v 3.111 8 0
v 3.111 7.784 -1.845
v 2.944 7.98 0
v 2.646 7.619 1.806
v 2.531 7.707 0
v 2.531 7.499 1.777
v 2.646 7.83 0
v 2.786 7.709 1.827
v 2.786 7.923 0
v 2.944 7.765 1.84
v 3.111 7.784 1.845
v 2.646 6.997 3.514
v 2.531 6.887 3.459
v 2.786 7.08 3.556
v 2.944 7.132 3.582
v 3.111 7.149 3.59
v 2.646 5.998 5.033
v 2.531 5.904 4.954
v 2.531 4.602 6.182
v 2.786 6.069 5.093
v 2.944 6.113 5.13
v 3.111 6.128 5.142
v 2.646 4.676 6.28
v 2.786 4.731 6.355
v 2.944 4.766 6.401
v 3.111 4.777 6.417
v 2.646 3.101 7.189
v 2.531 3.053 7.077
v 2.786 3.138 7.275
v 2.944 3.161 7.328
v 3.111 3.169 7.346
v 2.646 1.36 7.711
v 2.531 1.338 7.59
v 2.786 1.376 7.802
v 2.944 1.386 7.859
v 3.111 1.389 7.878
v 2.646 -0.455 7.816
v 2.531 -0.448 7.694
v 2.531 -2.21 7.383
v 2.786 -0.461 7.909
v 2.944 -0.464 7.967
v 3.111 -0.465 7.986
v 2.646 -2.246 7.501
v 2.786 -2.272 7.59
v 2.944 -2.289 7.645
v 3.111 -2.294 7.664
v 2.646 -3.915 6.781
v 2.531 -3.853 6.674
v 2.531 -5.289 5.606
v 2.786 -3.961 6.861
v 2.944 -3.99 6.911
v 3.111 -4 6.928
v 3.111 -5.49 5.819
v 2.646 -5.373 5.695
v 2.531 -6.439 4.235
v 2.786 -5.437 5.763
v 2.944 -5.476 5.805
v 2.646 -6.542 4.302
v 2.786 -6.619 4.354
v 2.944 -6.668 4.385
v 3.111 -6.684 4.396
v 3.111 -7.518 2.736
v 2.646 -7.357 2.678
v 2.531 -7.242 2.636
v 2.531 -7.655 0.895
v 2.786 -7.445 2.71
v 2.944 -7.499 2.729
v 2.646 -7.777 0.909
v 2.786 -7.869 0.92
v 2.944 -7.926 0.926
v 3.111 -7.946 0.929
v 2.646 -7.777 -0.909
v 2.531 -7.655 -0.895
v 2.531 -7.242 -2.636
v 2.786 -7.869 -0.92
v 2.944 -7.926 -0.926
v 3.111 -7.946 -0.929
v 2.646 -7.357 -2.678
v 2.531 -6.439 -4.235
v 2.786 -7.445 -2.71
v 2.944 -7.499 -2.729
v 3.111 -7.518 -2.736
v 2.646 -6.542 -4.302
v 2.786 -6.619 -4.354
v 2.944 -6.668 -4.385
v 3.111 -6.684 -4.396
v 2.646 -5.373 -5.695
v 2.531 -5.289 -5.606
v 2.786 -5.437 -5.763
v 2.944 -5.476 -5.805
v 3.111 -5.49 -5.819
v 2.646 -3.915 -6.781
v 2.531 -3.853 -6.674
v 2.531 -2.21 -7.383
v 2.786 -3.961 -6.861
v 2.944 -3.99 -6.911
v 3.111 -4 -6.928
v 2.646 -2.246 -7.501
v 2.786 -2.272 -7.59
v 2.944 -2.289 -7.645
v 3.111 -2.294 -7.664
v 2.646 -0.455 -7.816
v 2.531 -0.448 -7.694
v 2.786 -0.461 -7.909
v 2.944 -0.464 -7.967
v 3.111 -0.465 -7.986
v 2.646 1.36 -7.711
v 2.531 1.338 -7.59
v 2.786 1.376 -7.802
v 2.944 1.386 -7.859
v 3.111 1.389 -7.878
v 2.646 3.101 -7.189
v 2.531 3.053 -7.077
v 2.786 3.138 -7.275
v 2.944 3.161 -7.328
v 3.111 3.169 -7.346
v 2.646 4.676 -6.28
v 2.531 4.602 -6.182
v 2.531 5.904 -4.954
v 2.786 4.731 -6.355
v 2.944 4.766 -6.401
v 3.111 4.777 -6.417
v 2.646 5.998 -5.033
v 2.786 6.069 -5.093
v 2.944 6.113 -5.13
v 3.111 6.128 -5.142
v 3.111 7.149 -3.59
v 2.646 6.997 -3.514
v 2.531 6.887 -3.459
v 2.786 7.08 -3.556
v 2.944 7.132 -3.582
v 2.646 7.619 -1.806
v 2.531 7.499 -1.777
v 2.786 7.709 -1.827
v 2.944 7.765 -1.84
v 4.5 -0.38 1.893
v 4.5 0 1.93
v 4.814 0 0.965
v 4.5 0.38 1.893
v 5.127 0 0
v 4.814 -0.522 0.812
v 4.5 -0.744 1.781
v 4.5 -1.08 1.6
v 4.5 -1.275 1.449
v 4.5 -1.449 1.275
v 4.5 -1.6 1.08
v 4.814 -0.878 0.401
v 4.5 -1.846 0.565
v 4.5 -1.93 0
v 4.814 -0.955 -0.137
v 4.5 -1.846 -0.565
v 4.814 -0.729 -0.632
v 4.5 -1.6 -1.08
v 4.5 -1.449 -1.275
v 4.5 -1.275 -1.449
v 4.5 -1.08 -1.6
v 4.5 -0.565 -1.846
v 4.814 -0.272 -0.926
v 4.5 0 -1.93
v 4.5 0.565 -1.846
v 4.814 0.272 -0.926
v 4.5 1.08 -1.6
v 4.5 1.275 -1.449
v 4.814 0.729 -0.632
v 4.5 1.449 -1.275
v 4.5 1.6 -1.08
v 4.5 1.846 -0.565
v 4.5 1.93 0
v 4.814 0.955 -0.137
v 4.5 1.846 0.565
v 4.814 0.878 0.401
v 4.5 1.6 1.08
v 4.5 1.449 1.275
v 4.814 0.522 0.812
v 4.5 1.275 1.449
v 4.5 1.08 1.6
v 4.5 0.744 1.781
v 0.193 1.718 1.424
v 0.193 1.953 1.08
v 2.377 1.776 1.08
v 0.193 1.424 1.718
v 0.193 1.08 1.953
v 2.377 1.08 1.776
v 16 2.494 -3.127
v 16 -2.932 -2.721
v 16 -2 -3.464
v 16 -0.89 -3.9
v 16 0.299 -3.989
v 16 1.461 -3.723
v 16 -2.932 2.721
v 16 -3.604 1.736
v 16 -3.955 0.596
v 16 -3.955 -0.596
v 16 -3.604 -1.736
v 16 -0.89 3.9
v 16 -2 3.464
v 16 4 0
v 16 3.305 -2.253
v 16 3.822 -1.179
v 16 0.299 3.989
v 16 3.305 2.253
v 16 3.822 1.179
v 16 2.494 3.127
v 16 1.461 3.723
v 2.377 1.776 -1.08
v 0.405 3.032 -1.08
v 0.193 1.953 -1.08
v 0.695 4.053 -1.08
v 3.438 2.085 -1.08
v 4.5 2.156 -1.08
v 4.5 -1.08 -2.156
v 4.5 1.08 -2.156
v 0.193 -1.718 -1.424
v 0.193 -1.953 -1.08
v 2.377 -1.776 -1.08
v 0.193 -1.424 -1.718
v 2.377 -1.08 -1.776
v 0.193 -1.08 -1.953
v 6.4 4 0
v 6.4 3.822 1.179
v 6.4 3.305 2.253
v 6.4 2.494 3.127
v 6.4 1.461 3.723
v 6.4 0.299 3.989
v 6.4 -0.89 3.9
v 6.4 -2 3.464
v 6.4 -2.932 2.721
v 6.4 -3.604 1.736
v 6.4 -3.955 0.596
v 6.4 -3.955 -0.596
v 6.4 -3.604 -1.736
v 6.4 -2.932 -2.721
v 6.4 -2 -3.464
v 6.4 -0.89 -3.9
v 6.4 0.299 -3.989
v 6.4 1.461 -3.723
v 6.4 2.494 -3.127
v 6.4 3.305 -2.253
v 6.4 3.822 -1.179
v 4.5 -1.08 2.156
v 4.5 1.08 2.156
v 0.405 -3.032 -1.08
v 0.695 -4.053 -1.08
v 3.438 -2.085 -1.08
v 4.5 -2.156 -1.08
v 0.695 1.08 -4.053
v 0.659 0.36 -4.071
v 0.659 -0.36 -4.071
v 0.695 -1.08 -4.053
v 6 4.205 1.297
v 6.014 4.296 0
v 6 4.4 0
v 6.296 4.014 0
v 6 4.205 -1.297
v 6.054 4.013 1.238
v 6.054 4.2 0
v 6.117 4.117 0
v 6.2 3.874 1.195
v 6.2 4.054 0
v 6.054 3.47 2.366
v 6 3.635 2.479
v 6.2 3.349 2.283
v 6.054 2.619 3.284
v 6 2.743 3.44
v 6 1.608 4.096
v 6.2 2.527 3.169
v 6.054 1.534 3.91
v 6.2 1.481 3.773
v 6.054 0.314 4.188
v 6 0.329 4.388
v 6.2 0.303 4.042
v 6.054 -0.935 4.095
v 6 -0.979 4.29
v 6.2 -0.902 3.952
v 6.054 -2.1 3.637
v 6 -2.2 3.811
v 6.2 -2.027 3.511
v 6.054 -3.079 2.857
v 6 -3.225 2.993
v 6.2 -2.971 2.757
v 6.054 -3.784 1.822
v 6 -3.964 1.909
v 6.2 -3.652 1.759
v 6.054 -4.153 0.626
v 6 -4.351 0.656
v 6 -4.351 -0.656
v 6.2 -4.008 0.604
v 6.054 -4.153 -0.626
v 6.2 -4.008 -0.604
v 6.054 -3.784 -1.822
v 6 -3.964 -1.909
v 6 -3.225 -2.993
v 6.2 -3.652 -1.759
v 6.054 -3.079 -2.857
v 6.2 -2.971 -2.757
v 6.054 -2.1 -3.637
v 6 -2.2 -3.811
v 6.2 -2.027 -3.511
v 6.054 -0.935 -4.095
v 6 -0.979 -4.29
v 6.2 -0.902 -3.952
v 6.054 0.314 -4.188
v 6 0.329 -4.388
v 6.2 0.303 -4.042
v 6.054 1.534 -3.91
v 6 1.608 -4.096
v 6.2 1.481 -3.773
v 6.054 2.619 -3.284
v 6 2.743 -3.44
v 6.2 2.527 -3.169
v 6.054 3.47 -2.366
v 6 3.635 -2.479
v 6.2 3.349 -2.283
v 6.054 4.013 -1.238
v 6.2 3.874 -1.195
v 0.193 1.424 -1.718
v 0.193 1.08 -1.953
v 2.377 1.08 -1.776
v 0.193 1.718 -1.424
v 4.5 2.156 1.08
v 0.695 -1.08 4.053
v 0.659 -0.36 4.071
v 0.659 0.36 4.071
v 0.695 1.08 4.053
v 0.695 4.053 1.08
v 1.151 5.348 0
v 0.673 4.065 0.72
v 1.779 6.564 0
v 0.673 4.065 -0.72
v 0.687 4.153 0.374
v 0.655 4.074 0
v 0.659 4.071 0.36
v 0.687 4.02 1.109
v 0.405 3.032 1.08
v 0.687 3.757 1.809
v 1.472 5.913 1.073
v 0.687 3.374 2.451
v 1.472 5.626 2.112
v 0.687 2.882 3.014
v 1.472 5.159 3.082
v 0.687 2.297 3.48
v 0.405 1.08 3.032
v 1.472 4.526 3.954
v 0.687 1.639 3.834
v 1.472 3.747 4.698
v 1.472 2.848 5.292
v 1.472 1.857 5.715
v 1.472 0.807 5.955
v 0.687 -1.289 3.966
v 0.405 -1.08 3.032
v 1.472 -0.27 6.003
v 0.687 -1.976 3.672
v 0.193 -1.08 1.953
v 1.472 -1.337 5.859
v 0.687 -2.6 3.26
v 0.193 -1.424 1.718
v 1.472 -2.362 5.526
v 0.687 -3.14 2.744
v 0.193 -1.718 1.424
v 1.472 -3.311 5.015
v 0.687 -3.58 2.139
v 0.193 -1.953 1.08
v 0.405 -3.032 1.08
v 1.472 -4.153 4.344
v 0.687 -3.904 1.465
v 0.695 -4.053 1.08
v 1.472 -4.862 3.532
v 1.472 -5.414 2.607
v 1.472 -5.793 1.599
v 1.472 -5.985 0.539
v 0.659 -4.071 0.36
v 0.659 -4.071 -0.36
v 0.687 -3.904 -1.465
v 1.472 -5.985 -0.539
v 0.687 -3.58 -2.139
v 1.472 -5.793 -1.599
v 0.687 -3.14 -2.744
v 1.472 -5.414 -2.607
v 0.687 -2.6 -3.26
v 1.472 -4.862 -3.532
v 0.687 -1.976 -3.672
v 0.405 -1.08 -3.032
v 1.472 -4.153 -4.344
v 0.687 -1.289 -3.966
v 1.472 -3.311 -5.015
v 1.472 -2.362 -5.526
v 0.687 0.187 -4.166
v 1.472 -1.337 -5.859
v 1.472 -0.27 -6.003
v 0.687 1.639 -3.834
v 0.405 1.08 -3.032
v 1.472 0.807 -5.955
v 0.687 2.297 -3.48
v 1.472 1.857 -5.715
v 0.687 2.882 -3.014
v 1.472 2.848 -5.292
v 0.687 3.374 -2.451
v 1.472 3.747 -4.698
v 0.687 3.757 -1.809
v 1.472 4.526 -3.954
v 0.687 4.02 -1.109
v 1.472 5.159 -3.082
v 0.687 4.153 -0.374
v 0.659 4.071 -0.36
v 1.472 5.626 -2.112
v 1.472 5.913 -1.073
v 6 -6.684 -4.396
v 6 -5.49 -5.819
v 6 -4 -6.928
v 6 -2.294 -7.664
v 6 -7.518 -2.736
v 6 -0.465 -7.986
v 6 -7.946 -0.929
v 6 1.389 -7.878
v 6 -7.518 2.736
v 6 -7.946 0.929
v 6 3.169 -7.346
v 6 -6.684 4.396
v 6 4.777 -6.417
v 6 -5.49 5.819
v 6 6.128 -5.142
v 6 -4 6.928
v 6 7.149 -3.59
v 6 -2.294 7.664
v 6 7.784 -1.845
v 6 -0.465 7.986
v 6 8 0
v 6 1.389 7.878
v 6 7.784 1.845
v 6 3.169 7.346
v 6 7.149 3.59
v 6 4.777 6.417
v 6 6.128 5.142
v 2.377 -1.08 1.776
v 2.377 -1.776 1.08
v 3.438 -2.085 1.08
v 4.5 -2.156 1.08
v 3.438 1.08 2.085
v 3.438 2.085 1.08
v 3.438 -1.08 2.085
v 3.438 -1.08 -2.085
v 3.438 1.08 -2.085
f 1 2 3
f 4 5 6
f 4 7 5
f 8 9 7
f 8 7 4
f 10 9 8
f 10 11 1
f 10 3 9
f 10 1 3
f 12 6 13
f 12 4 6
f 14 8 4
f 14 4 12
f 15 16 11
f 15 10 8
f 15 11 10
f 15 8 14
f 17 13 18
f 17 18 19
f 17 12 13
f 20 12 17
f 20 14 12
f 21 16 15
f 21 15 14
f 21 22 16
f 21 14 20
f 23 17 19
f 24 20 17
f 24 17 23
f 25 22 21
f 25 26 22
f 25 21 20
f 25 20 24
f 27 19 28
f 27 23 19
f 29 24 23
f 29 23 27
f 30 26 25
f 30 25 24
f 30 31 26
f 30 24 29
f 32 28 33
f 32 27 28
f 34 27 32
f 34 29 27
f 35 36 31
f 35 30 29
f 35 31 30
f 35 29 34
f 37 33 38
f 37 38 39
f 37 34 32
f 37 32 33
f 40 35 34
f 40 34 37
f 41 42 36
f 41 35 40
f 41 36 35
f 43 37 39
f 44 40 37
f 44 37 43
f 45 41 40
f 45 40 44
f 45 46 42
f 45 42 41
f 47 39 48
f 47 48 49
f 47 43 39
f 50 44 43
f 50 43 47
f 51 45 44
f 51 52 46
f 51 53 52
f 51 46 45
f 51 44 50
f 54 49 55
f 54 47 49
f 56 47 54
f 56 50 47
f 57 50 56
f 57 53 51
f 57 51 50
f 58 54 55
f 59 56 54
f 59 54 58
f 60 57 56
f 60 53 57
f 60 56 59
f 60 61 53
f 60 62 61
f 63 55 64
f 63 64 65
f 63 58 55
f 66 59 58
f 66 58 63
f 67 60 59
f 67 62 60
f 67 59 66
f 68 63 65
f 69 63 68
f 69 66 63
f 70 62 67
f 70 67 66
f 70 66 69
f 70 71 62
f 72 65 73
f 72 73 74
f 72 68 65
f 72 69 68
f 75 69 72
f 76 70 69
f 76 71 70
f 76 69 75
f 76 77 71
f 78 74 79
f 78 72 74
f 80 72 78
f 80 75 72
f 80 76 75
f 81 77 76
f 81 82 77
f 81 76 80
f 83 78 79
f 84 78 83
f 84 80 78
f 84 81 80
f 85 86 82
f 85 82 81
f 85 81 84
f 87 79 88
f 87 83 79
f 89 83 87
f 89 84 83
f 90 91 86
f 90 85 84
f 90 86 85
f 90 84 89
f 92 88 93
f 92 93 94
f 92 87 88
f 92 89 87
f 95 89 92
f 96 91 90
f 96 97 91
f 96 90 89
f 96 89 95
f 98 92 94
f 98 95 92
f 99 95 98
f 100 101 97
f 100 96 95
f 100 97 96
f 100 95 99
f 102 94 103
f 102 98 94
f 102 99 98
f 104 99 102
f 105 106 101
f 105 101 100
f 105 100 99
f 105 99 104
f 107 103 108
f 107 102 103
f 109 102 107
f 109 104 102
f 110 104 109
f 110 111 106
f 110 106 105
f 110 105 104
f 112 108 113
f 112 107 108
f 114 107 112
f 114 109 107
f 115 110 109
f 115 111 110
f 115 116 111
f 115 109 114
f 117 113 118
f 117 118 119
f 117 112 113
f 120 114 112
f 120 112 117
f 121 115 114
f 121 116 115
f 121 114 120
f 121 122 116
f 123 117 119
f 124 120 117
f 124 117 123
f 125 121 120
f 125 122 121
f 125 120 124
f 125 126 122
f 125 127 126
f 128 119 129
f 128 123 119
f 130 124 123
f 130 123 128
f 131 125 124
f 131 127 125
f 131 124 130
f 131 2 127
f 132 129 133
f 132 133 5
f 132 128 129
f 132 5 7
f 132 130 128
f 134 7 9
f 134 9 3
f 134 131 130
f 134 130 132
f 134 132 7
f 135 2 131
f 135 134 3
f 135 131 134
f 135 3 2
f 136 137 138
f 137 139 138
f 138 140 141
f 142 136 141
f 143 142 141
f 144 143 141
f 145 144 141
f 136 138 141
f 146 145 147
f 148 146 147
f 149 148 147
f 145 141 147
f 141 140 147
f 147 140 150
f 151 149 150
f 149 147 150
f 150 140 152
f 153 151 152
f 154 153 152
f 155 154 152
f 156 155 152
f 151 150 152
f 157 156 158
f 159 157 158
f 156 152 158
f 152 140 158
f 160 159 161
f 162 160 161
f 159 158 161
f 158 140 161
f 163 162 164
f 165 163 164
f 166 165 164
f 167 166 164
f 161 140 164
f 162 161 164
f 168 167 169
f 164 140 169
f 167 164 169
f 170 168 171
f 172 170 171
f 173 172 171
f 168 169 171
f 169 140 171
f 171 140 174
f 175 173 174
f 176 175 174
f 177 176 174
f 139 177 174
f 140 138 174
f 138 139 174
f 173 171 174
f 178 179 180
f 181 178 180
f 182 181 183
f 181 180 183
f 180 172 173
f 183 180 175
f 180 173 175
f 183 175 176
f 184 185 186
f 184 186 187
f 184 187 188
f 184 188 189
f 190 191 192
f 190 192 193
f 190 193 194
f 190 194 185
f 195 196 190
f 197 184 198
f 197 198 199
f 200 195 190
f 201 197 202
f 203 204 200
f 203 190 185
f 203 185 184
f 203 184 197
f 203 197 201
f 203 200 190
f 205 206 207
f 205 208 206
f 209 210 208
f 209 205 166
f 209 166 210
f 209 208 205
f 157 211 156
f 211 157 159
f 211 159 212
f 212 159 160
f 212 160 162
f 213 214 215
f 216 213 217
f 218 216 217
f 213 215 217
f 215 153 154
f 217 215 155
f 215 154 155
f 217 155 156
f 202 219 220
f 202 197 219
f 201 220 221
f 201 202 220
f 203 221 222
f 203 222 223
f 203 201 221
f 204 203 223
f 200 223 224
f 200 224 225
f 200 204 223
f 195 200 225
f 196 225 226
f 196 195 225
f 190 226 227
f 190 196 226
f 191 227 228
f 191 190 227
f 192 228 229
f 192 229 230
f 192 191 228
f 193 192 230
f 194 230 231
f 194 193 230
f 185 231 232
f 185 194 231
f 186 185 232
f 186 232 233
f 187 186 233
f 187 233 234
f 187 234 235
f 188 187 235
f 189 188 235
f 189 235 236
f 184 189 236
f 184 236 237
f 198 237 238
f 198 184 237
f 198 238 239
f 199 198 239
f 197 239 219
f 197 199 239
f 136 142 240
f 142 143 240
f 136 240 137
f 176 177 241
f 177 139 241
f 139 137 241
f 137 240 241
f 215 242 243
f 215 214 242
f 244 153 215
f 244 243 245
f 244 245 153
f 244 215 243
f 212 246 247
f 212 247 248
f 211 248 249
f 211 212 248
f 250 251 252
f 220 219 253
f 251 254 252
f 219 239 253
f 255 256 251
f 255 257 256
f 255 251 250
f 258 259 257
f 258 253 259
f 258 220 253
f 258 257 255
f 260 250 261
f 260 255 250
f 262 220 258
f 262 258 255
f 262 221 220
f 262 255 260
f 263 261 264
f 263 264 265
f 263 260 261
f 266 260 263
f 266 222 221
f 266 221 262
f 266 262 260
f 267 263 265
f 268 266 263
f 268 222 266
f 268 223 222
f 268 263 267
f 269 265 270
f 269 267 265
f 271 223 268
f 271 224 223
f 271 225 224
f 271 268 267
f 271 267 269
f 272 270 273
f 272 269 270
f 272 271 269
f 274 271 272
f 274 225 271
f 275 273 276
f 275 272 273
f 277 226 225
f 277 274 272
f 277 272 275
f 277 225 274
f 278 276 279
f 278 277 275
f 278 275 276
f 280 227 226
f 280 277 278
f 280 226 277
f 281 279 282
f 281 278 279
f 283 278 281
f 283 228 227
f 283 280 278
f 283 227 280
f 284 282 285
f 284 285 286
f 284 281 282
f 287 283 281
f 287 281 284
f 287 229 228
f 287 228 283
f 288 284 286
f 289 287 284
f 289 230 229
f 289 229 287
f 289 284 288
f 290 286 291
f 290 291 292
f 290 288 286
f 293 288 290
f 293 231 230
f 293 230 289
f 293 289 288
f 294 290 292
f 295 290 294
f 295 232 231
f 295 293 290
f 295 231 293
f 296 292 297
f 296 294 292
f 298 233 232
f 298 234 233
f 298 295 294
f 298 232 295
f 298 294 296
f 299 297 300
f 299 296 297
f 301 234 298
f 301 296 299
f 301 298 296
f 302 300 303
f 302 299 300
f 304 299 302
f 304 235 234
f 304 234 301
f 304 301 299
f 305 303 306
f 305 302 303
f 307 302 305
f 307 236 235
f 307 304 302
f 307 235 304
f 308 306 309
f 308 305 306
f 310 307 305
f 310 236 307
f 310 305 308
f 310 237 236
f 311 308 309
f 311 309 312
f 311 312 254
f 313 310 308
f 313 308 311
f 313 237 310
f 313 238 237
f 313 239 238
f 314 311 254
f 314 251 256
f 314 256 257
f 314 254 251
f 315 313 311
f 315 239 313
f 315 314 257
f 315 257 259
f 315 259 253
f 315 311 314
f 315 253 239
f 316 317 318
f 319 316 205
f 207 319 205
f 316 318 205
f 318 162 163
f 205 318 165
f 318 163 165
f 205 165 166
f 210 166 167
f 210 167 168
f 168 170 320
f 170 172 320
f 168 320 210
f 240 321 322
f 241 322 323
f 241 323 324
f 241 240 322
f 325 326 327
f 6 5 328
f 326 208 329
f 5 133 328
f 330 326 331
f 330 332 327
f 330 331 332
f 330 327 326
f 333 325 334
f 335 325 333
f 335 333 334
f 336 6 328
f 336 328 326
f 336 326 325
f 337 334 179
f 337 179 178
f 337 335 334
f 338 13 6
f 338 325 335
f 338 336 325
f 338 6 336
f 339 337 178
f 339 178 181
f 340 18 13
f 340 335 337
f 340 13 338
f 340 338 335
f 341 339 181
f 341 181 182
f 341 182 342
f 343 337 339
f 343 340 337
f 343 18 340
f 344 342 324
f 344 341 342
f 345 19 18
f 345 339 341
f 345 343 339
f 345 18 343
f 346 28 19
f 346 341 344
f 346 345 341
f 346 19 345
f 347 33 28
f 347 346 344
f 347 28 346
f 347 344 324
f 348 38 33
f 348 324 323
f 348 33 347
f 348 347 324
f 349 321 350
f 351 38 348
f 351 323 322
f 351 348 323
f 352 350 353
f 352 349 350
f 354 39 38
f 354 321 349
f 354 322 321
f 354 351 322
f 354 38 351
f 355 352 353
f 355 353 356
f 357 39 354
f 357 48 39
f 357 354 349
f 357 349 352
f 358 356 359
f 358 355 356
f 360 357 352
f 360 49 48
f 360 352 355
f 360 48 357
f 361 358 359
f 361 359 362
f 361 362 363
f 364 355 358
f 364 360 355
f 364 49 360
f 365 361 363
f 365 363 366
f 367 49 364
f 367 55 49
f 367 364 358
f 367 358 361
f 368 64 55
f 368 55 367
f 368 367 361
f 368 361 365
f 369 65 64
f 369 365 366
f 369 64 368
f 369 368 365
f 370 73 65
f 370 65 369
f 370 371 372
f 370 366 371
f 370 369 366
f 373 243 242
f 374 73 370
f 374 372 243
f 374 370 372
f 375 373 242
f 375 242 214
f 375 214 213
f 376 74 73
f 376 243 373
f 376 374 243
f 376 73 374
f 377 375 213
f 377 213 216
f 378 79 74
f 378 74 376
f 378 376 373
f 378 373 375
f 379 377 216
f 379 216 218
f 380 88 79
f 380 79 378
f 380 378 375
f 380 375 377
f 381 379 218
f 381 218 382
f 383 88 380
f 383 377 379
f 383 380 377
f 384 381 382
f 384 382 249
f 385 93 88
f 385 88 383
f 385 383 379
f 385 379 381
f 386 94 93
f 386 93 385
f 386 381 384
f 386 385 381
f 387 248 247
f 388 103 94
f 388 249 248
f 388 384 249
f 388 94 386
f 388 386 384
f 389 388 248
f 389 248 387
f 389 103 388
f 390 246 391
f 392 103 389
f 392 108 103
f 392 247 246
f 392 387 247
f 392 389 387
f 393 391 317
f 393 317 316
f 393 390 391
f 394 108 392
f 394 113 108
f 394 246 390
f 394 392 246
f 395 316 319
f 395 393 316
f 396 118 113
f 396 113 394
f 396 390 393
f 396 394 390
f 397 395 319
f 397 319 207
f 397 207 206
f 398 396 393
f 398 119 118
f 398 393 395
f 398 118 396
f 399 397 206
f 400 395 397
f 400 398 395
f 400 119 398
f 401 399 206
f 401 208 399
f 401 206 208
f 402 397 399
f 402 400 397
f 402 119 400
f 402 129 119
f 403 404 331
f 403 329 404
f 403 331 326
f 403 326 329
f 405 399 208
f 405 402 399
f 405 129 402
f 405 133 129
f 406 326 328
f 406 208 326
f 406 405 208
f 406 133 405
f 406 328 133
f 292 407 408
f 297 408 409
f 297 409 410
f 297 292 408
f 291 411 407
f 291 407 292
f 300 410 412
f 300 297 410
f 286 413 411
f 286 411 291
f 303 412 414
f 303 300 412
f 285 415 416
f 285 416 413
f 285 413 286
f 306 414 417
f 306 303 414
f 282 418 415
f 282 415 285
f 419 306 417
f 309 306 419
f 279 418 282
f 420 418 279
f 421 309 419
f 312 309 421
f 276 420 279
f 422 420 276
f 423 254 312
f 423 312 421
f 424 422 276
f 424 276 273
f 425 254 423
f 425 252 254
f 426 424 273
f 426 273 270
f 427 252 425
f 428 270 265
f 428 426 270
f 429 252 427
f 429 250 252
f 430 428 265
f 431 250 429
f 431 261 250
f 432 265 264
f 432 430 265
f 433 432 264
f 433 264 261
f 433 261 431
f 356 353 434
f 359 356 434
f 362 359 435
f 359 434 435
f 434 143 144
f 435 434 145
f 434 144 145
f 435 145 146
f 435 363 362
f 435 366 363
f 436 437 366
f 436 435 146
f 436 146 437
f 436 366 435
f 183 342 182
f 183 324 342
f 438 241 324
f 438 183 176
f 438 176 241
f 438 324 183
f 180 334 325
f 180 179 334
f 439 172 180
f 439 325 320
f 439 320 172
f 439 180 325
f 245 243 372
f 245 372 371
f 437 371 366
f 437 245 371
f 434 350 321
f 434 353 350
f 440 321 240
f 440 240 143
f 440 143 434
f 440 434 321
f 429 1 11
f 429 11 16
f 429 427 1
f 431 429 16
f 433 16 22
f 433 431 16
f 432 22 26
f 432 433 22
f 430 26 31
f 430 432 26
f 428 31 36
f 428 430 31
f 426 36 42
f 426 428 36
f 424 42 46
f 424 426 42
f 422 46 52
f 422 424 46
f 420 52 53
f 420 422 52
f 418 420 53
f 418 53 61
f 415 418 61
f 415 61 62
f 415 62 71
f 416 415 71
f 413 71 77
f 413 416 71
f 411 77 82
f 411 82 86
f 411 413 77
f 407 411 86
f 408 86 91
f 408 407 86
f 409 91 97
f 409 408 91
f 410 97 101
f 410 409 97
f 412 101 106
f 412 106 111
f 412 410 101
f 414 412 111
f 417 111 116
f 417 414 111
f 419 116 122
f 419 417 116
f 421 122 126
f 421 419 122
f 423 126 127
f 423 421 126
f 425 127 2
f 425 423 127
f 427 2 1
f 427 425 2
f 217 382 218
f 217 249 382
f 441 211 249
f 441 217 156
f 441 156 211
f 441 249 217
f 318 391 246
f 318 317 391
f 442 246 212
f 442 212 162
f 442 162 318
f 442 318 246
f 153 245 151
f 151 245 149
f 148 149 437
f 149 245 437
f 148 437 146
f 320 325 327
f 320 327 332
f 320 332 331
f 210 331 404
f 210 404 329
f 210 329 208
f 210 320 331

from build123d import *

# Parameters (mm, degrees)
RECPAT_COUNT = 2
RECPAT_ANGLE = 90


with BuildPart() as part:
    # Fillet1: read off the stored shape, not the designer's step
    # Fillet1 outline → Fillet1 (revolve)
    with BuildSketch(Plane.YX):
        with BuildLine():
            Line((4, 6.4), (4, 16))
            Line((4, 16), (0, 16))
            Line((0, 16), (0, 0))
            ThreePointArc((0, 0), (4.055866915, 0.648888974), (7.706840396, 2.530777913))
            ThreePointArc((7.706840396, 2.530777913), (7.922543805, 2.785746454), (8, 3.110611748))
            Line((8, 3.110611748), (8, 6))
            Line((8, 6), (4.4, 6))
            ThreePointArc((4.4, 6), (4.117157288, 6.117157288), (4, 6.4))
        make_face()
    revolve(axis=Axis((0, 0, 0), (1, 0, 0)))

    # Sketch3 → Recess section 0
    with BuildSketch(Plane(origin=(0, 0, 0), x_dir=(0, 0, -1), z_dir=(1, 0, 0))):
        with BuildLine():
            Line((1.08, -4.4), (-1.08, -4.4))
            Line((-1.08, -4.4), (-1.08, 4.4))
            Line((-1.08, 4.4), (1.08, 4.4))
            Line((1.08, 4.4), (1.08, -4.4))
        make_face()
    # Sketch4 → Recess section 1
    with BuildSketch(Plane(origin=(4.5, 0, 0), x_dir=(0, 0, -1), z_dir=(1, 0, 0))):
        with BuildLine():
            Line((1.08, -2.156383139), (-1.08, -2.156383139))
            Line((-1.08, -2.156383139), (-1.08, 2.156383139))
            Line((-1.08, 2.156383139), (1.08, 2.156383139))
            Line((1.08, 2.156383139), (1.08, -2.156383139))
        make_face()
    recess = loft(mode=Mode.SUBTRACT)

    # RecPat: Recess ×2 about axis
    recpat_axis = Axis((0, 0, 0), (1, 0, 0))
    for i in range(1, RECPAT_COUNT):
        add(recess.rotate(recpat_axis, i * RECPAT_ANGLE / (RECPAT_COUNT - 1)), mode=Mode.SUBTRACT)

    # RecCorSke → RecessCore (revolve, cut)
    with BuildSketch(Plane.XY, mode=Mode.PRIVATE) as recesscore_sk:
        Polygon((0, 0), (0, 2.245170654), (4.5, 1.9305), (5.127257474, 0), align=None)
    revolve(recesscore_sk.sketch.rotate(Axis((-3.175, 0, 0), (1, 0, 0)), 90), axis=Axis((-3.175, 0, 0), (1, 0, 0)), mode=Mode.SUBTRACT)


solid = part.part
